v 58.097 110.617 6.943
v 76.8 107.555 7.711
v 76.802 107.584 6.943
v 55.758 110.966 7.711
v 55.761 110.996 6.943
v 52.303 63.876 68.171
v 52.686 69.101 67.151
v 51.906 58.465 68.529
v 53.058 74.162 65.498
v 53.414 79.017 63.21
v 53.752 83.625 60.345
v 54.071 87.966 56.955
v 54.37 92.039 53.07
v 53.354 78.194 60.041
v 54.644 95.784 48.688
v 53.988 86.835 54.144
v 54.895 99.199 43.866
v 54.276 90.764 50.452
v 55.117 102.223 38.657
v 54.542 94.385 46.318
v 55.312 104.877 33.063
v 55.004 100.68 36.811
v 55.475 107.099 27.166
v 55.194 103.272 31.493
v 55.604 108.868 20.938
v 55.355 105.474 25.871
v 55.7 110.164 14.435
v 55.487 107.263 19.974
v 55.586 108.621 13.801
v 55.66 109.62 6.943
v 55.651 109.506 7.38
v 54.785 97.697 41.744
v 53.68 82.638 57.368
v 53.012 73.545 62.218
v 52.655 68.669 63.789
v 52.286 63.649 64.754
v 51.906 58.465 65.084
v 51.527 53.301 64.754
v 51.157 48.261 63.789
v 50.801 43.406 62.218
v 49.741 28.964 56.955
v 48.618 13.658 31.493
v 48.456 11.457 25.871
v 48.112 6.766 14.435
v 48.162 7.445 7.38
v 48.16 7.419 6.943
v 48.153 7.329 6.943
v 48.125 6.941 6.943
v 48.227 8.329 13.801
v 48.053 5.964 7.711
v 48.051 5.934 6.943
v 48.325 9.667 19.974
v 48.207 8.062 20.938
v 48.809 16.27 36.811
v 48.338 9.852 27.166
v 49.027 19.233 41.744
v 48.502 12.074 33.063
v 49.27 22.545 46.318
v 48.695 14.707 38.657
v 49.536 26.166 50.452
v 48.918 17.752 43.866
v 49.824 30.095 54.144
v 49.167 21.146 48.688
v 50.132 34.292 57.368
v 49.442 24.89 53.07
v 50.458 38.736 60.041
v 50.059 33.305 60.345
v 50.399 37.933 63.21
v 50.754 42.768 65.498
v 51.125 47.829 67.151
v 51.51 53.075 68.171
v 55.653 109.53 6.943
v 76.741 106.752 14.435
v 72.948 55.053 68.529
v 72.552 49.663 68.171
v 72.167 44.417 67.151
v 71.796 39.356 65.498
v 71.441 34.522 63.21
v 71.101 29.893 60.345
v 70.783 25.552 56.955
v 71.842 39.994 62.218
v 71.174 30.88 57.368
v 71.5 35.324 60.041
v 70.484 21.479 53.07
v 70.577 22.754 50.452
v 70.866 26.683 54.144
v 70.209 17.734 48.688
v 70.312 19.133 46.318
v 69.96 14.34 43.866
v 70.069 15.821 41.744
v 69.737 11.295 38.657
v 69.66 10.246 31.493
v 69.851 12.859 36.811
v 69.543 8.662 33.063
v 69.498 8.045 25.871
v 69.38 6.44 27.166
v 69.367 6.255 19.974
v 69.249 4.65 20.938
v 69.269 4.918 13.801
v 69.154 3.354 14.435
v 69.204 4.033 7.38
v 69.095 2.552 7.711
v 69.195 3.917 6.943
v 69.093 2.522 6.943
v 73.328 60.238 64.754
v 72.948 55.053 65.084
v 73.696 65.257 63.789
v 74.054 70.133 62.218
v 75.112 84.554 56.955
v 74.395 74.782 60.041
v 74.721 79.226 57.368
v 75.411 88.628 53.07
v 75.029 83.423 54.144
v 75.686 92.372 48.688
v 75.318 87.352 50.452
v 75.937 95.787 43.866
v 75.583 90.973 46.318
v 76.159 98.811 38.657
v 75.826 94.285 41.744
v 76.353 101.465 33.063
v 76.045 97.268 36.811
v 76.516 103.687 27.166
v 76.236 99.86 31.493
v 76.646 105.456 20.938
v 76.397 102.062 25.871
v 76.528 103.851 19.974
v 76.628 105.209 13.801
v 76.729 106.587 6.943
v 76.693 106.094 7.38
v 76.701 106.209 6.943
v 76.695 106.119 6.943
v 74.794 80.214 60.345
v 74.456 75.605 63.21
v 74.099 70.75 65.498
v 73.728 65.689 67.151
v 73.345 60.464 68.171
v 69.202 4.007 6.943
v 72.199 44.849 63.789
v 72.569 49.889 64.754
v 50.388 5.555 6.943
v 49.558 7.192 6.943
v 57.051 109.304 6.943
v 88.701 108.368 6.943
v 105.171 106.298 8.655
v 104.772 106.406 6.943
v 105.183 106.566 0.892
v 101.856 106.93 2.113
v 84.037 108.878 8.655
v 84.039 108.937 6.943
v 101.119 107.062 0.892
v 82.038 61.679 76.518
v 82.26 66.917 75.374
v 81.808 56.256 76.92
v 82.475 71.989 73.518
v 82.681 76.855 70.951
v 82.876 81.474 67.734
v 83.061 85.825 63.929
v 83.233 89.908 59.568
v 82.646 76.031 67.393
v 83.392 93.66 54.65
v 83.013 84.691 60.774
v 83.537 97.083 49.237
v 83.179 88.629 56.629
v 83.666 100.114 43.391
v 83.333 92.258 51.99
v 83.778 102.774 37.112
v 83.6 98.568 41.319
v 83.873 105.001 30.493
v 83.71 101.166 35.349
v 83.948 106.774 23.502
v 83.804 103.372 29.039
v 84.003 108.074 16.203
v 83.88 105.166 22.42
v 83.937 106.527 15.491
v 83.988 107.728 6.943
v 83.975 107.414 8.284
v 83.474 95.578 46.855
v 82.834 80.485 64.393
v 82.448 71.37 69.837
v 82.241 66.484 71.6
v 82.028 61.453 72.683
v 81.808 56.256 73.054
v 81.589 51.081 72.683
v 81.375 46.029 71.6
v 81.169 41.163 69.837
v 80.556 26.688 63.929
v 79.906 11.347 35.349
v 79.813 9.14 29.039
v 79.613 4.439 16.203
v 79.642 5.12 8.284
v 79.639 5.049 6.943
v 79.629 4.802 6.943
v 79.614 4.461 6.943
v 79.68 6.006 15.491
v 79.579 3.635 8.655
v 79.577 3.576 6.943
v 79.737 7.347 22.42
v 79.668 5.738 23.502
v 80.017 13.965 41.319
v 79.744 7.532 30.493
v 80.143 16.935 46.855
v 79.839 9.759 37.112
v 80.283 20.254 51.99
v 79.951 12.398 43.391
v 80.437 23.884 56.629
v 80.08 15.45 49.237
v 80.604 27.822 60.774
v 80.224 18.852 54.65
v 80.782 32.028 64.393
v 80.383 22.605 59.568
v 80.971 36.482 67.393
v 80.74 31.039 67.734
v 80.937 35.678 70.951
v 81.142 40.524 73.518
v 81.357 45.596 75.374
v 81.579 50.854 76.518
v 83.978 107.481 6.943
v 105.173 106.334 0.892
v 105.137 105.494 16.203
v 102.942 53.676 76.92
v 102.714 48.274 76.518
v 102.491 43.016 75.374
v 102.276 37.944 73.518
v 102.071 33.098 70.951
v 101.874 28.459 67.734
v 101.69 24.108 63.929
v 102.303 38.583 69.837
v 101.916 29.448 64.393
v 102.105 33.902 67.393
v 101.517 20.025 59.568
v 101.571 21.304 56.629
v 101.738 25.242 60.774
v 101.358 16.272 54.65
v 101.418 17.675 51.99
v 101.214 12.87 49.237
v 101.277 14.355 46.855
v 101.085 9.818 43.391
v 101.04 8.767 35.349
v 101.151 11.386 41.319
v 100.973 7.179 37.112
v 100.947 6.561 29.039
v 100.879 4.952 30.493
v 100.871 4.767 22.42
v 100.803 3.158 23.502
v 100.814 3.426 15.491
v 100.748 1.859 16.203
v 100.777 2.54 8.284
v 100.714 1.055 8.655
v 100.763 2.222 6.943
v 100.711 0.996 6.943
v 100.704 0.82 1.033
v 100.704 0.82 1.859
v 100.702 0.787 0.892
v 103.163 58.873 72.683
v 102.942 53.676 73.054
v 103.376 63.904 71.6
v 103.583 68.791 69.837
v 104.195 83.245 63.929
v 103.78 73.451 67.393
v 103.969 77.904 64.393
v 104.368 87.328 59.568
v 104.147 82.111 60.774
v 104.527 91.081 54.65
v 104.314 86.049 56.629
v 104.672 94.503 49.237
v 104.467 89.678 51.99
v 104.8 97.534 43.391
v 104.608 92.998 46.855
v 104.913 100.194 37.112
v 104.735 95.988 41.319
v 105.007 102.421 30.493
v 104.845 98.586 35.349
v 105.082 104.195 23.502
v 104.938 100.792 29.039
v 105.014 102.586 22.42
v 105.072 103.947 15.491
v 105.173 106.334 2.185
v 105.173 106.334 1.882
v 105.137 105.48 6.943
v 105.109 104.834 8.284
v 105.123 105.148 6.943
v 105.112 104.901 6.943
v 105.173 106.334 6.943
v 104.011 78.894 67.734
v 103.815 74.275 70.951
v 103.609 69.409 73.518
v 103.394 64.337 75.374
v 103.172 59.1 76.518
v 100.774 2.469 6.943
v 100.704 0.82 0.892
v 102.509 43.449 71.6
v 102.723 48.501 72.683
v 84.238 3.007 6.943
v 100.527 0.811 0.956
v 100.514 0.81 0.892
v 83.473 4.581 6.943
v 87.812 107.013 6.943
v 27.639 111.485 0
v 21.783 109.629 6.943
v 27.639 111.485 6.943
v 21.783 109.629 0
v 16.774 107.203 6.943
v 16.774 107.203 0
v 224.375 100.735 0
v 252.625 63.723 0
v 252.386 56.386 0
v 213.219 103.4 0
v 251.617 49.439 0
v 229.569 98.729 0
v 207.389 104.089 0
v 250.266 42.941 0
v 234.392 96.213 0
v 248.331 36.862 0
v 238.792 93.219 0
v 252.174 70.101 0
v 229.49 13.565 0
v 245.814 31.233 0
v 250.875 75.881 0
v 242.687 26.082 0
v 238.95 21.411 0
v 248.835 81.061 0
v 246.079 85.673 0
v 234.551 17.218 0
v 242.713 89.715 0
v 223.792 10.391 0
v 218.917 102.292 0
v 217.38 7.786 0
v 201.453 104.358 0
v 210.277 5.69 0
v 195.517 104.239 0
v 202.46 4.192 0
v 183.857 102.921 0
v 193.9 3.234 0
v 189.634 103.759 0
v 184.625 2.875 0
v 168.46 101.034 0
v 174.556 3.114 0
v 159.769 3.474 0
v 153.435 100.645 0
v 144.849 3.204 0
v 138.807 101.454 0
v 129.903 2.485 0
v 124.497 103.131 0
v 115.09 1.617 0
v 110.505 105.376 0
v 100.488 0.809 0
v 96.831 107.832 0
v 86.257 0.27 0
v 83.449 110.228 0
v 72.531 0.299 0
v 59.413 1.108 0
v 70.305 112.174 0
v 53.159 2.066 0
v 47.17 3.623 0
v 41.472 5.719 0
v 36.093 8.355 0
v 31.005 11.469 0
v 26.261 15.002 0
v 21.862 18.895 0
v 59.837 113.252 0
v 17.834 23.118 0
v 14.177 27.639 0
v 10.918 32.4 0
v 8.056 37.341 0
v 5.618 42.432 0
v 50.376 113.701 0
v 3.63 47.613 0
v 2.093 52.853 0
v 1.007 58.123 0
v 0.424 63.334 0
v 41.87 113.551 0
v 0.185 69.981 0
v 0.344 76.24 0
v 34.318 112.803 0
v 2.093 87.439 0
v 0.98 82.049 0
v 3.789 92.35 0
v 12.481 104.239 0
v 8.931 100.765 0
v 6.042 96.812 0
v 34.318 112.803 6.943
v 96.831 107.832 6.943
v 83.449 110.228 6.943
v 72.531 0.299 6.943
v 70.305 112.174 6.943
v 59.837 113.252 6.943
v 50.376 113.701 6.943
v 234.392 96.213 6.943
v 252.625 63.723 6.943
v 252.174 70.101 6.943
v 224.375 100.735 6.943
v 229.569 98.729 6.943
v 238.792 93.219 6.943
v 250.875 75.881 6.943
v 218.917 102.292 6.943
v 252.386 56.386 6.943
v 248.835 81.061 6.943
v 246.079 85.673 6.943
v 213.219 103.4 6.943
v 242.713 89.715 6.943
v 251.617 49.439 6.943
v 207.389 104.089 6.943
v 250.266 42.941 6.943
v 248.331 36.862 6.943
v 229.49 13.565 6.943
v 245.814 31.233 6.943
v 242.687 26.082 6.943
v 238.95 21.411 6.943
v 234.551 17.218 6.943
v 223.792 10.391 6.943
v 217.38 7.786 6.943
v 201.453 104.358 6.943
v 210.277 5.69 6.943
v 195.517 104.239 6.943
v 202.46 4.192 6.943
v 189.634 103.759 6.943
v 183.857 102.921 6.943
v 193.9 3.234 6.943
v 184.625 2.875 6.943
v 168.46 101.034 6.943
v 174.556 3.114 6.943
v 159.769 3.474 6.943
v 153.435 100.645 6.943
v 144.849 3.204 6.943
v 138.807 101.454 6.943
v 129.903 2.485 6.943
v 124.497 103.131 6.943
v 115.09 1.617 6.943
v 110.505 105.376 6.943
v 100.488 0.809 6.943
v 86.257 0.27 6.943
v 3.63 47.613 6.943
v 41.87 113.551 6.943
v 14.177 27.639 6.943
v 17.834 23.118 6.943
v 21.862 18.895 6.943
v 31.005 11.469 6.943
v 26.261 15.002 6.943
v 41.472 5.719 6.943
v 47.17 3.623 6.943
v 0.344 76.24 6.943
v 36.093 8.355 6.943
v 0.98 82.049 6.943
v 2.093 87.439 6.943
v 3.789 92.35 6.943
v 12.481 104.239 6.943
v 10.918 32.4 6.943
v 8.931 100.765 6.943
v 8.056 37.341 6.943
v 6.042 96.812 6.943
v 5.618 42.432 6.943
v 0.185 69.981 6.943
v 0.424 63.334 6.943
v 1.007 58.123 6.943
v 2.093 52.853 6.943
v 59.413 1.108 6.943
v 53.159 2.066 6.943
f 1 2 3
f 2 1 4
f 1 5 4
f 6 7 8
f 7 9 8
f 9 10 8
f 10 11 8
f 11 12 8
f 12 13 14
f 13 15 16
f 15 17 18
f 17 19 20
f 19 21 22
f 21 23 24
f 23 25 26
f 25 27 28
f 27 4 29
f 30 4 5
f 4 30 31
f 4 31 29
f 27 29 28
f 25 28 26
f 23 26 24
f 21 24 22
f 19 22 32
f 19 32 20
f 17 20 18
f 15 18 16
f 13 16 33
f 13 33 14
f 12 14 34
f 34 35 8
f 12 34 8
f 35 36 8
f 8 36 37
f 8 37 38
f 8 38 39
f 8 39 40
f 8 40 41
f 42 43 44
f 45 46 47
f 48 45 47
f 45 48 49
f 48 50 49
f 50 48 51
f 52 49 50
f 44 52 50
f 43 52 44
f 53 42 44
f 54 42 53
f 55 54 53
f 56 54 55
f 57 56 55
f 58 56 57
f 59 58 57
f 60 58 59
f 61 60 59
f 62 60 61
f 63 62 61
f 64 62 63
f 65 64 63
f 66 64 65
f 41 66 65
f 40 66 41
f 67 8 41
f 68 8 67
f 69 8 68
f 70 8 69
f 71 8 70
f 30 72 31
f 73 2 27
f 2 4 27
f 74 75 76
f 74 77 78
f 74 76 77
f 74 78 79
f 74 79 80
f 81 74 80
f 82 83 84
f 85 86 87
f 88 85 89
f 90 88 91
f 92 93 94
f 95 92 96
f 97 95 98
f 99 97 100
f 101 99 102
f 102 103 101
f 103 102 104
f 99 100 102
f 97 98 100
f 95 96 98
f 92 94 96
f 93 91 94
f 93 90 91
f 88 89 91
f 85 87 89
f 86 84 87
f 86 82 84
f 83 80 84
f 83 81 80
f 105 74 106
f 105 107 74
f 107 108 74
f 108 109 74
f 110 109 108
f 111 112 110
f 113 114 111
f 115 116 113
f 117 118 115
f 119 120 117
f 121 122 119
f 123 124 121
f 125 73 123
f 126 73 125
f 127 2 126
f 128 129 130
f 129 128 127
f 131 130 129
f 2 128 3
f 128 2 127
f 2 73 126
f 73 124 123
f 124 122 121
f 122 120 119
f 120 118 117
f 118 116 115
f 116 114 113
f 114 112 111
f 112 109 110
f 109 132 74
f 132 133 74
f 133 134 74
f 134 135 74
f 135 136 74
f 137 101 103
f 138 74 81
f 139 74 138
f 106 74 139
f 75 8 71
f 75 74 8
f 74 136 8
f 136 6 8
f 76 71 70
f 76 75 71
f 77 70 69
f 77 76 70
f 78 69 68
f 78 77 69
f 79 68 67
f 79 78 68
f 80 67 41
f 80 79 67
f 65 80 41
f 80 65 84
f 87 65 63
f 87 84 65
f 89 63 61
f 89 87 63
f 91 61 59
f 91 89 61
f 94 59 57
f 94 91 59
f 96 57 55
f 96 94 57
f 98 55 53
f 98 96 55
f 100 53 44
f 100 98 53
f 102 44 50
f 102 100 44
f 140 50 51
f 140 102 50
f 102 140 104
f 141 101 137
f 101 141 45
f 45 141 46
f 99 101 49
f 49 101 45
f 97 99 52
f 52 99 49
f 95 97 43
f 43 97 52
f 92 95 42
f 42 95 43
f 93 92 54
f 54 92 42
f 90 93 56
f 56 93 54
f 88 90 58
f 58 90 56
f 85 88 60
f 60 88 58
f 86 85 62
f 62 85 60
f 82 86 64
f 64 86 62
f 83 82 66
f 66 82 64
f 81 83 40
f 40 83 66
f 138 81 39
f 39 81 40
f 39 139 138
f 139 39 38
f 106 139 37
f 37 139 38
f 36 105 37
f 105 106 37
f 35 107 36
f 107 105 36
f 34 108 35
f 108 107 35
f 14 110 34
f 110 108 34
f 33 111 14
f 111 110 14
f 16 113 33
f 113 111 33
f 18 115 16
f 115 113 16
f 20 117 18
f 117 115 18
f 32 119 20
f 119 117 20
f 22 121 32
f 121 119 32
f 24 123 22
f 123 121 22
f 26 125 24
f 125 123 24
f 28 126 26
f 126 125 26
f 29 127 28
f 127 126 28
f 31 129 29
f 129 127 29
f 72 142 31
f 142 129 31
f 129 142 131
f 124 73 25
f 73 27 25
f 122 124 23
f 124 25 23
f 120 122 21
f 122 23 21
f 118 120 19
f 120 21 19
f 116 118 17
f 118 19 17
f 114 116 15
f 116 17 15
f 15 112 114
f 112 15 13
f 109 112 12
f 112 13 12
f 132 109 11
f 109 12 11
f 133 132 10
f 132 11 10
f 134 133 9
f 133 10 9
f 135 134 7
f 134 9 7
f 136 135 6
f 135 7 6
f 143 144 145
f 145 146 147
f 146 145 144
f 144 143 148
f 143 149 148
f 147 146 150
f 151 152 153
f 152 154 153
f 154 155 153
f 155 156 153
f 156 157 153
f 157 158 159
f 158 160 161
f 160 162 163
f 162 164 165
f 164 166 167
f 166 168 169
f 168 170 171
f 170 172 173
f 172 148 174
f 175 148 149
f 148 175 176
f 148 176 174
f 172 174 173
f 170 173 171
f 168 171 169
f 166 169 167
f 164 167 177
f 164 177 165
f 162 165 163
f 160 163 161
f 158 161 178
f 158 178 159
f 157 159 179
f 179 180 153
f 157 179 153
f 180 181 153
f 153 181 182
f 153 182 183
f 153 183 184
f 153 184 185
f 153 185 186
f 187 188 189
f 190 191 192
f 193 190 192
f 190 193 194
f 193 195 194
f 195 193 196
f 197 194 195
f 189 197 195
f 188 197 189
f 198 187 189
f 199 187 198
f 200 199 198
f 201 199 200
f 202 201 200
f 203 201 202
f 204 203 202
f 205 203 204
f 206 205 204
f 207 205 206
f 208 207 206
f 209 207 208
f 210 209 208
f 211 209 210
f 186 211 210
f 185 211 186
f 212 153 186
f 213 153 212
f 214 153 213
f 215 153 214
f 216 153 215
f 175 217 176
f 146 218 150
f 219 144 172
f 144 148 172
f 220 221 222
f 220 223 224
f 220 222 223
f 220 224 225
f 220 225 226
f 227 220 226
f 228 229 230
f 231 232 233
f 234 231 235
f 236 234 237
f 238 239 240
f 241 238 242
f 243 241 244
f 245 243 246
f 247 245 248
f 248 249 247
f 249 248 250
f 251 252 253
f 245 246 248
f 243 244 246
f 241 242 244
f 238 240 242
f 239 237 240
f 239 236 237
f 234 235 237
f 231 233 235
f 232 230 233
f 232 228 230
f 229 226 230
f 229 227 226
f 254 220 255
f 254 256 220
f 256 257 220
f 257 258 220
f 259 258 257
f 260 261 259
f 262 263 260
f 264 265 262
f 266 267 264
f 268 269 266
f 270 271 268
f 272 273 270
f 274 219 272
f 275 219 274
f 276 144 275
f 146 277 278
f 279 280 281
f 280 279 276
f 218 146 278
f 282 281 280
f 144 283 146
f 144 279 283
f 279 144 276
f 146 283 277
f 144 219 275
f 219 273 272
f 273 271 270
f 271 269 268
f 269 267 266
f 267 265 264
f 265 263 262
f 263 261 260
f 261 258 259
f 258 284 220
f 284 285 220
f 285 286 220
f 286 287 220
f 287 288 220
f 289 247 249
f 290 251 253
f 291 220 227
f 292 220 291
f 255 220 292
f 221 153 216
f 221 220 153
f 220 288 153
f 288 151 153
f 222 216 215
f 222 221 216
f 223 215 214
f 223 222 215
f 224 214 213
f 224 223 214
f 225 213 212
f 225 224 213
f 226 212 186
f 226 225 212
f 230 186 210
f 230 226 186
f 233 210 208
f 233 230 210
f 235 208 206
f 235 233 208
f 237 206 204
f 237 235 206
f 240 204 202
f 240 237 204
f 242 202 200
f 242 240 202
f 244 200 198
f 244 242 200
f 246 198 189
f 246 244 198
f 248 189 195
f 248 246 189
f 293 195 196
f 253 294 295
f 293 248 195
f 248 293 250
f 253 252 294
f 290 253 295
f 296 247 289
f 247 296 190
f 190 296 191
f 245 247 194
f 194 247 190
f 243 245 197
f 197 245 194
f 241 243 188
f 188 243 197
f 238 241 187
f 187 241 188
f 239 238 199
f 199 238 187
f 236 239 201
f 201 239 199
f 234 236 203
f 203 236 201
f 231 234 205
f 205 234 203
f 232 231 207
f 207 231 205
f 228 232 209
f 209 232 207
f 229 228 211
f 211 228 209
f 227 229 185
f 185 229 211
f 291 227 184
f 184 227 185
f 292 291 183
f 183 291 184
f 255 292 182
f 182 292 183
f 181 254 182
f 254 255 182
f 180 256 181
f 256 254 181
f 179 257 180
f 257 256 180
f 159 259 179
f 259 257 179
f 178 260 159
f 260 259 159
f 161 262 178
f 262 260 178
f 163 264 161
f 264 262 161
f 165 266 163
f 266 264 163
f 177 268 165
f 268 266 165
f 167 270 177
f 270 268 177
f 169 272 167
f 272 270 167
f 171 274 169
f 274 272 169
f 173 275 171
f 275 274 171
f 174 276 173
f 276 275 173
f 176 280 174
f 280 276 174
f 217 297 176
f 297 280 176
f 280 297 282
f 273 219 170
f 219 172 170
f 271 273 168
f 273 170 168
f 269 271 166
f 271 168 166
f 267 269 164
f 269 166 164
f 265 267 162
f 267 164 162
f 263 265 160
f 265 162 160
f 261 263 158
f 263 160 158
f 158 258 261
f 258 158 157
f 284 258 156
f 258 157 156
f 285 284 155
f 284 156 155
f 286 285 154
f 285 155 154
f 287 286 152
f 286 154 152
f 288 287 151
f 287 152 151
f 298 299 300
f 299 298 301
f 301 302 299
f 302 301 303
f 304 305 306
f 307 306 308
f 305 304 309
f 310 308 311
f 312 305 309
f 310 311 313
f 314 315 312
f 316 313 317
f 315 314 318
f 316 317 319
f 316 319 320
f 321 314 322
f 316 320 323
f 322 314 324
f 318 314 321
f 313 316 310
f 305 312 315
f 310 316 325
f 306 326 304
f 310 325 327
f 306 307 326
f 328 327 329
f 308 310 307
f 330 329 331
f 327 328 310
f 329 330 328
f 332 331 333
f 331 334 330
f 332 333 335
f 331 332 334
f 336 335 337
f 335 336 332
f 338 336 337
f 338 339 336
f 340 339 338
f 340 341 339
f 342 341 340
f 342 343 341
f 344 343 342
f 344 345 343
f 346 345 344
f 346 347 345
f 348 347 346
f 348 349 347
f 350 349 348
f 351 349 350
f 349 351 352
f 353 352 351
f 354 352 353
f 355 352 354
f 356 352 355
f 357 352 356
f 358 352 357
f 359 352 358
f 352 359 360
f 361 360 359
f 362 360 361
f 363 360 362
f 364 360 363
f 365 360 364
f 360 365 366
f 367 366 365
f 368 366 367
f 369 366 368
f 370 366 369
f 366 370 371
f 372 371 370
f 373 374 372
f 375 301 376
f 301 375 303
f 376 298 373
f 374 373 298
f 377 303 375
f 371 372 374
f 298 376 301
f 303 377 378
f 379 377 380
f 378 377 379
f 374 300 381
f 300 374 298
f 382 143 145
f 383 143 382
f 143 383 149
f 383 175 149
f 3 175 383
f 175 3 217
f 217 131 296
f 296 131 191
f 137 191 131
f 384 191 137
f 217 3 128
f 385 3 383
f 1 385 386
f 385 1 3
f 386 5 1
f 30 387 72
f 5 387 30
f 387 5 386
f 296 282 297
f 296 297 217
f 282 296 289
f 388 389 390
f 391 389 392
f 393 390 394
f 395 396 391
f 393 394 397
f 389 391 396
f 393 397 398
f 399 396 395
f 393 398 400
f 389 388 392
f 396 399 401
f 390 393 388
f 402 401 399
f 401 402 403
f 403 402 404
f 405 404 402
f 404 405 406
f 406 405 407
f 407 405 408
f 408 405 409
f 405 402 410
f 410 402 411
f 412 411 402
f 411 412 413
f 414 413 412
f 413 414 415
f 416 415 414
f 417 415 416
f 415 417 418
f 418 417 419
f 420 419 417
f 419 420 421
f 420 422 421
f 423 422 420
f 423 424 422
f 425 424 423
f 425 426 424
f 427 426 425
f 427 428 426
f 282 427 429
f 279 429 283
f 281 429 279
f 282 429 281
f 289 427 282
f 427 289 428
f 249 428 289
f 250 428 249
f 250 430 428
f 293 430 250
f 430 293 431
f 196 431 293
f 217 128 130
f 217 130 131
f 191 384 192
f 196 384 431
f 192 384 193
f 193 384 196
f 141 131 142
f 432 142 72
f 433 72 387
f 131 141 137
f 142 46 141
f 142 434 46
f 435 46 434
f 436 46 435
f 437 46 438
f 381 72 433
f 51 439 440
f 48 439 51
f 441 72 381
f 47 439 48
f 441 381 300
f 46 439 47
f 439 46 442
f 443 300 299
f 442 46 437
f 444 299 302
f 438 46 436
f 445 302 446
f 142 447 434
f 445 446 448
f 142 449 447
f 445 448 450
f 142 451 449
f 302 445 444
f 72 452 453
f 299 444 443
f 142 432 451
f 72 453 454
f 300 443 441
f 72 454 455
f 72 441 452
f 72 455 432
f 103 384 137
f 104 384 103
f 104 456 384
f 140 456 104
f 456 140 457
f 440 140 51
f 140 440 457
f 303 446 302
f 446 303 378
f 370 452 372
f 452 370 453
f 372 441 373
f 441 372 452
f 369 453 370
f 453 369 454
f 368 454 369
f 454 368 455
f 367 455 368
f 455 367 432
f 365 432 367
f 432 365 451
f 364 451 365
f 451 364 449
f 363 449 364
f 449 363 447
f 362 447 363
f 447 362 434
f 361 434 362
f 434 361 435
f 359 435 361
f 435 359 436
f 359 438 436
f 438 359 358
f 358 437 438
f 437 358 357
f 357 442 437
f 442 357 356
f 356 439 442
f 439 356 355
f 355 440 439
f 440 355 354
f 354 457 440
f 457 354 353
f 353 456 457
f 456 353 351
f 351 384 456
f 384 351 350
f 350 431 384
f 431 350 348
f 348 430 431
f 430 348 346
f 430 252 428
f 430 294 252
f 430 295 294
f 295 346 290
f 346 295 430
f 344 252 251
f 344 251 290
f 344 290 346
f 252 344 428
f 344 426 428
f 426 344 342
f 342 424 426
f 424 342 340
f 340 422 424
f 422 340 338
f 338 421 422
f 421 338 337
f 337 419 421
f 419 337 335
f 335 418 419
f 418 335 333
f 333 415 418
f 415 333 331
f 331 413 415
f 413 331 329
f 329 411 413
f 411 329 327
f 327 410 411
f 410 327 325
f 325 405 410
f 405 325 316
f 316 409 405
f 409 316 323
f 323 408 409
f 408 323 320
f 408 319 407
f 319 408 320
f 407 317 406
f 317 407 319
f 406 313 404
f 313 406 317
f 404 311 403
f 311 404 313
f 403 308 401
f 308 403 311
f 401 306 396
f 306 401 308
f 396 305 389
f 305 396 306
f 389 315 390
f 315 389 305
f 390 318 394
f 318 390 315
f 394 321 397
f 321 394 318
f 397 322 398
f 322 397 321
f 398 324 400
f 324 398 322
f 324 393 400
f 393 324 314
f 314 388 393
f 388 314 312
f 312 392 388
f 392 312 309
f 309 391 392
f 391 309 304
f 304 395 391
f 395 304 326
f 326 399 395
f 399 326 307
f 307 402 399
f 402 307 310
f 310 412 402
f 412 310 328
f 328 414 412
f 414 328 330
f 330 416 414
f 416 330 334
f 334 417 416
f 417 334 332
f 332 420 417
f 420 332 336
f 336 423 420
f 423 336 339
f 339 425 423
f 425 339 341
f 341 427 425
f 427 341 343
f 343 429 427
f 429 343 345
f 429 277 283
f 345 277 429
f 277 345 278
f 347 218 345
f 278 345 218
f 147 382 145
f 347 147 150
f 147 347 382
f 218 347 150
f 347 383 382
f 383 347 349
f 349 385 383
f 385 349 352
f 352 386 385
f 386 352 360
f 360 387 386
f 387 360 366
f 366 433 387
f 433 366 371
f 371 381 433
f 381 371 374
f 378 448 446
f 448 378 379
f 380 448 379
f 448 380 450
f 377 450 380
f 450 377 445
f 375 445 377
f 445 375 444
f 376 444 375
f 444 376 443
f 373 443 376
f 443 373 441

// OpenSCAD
//OPENSTOCK by isaac budmen @ibudmen
// preview[view:south west, tilt:top diagonal]

Which_Foot = "first"; // [first:Left,second:Right]

// 1 wide or 2 thin?
Number_of_Straps = "second"; // [first:Single,second:Double]

sandal_size =  "fifth";// [first:Size 6,second:Size 6.5,third:Size 7,fourth:Size 7.5,fifth:Size 8,sixth:Size 8.5,seventh:Size 9,eigth:Size 9.5,ninth:Size 10,tenth:Size 10.5,eleventh:Size 11,twelveth:Size 11.5]

module print_Number_of_Straps() {
	if (Number_of_Straps == "first") {
		single();
	} else if (Number_of_Straps == "second") {
		double();
	}
}

module sandal(){print_Number_of_Straps(); print_foot();};


print_sandal_size();

module print_sandal_size() {
	if (sandal_size == "first") {
		scale([2.5,2.825,3.275])sandal();
	} else if (sandal_size == "second") {
		scale([2.55,2.8815,3.3405])sandal();
	} else if (sandal_size == "third") {
		scale([2.58,2.9154,3.3798])sandal();
	} else if (sandal_size == "fourth") {
		scale([2.6,2.938,3.406])sandal();
	} else if (sandal_size == "fifth") {
		scale([2.65,2.9945,3.4715])sandal();
	} else if (sandal_size == "sixth") {
		scale([2.7,3.051,3.537])sandal();
	} else if (sandal_size == "seventh") {
		scale([2.75,3.1075,3.6025])sandal();
	} else if (sandal_size == "eighth") {
		scale([2.8,3.164,3.668])sandal();
	} else if (sandal_size == "nineth") {
		scale([2.85,3.2205,3.7335])sandal();
	} else if (sandal_size == "tenth") {
		scale([2.9,3.277,3.799])sandal();
	} else if (sandal_size == "eleventh") {
		scale([2.95,3.3335,3.8645])sandal();
	} else if (sandal_size == "twelveth") {
		scale([3,3.39,3.93])sandal();
	}

}



module single(){
rotate([0,0,-3]){
translate([14,2.8,0])scale([2.7,1,1])Strap();
}}

module double(){rotate([0,0,-3])translate([18,2.8,0])scale([1,1,0.98])Strap();rotate([0,0,-1])translate([30,1.6,0])scale([1,1,1.1])Strap();}

module print_foot() {
	if (Which_Foot == "first") {
		Base1();
	} else if (Which_Foot == "second") {
		Base2();
	}
}

module Base(){rotate([180,0,-6])translate([0,-40.5,0])Base1();} 

/////////////////////
// MODULE Base1
/////////////////////

// Functions and Utilities
function Base1_dimX() = 95.26;
function Base1_dimY() = 37.88;
function Base1_dimZ() = 2.00;

/////////////////////
// geometry for Base1
function Base1_triangles() = [
[2,1,0],[3,1,2],[5,0,4],[2,0,5],[8,7,6],[9,7,8],[10,9,8],[11,10,8],[12,11,8],[13,12,8],[5,13,8],[2,5,8],[3,2,8],[14,3,8],[15,14,8],[16,15,8],[17,16,8],[18,17,8],[19,18,8],[20,19,8],[21,20,8],[22,21,8],[8,23,22],[8,24,23],[8,25,24],[8,26,25],[8,27,26],[28,27,8],[29,28,8],[30,29,8],[31,30,8],[32,31,8],[33,32,8],[34,33,8],[35,34,8],[36,35,8],[37,36,8],[38,37,8],[39,38,8],[40,39,8],[41,40,8],[42,41,8],[43,42,8],[44,43,8],[45,44,8],[46,45,8],[47,46,8],[48,47,8],[49,48,8],[50,49,8],[51,50,8],[52,51,8],[53,52,8],[54,53,8],[55,54,8],[56,55,8],[57,56,8],[58,57,8],[59,58,8],[60,59,8],[8,61,60],[8,62,61],[63,62,8],[64,63,8],[65,64,8],[66,65,8],[67,66,8],[68,67,8],[69,68,8],[70,69,8],[71,70,8],[72,71,8],[73,72,8],[74,73,8],[75,74,8],[76,75,8],[77,76,8],[78,77,8],[79,78,8],[80,79,8],[81,80,8],[82,81,8],[3,83,1],[14,83,3],[86,85,84],[88,84,87],[86,84,88],[87,84,89],[89,84,90],[90,84,91],[91,84,92],[92,84,93],[93,84,94],[94,84,95],[95,84,96],[96,84,97],[97,84,98],[98,84,99],[99,84,100],[100,84,101],[101,84,102],[102,84,103],[103,84,104],[104,84,105],[105,84,106],[106,84,107],[107,84,108],[108,84,109],[109,84,110],[110,84,111],[111,84,112],[112,84,113],[113,84,114],[114,84,115],[115,84,116],[116,84,117],[117,84,118],[118,84,119],[119,84,120],[120,84,121],[121,84,122],[122,84,123],[123,84,124],[124,84,125],[125,84,126],[126,84,127],[127,84,128],[128,84,129],[129,84,130],[130,84,131],[131,84,132],[132,84,133],[133,84,134],[134,84,135],[135,84,136],[136,84,137],[137,84,138],[138,84,139],[139,84,140],[140,84,141],[141,84,142],[142,84,143],[143,84,144],[144,84,145],[145,84,146],[146,84,147],[147,84,148],[148,84,149],[149,84,150],[150,84,151],[151,84,152],[152,84,83],[83,84,1],[1,84,0],[0,84,4],[4,84,153],[153,84,154],[154,84,155],[155,84,156],[156,84,157],[157,84,158],[158,84,159],[13,4,153],[5,4,13],[8,85,82],[84,85,8],[8,159,84],[6,159,8],[82,86,81],[85,86,82],[81,88,80],[86,88,81],[80,87,79],[88,87,80],[79,89,78],[87,89,79],[78,90,77],[89,90,78],[77,91,76],[90,91,77],[76,92,75],[91,92,76],[75,93,74],[92,93,75],[94,73,74],[94,74,93],[95,72,73],[95,73,94],[96,71,72],[96,72,95],[97,70,71],[97,71,96],[98,69,70],[98,70,97],[99,68,69],[99,69,98],[100,67,68],[100,68,99],[101,66,67],[101,67,100],[102,65,66],[102,66,101],[103,64,65],[103,65,102],[104,63,64],[104,64,103],[105,62,63],[105,63,104],[106,61,62],[106,62,105],[107,60,61],[107,61,106],[108,59,60],[108,60,107],[109,58,59],[109,59,108],[110,57,58],[110,58,109],[111,56,57],[111,57,110],[112,55,56],[112,56,111],[113,54,55],[113,55,112],[114,53,54],[114,54,113],[115,52,53],[115,53,114],[116,51,52],[116,52,115],[117,50,51],[117,51,116],[118,49,50],[118,50,117],[119,48,49],[119,49,118],[120,47,48],[120,48,119],[121,46,47],[121,47,120],[122,45,46],[122,46,121],[123,44,45],[123,45,122],[124,43,44],[124,44,123],[125,42,43],[125,43,124],[125,126,41],[125,41,42],[126,127,40],[126,40,41],[127,128,39],[127,39,40],[128,129,38],[128,38,39],[129,130,37],[129,37,38],[36,130,131],[37,130,36],[35,131,132],[36,131,35],[34,132,133],[35,132,34],[33,133,134],[34,133,33],[32,134,135],[33,134,32],[31,135,136],[32,135,31],[30,136,137],[31,136,30],[29,137,138],[30,137,29],[28,138,139],[29,138,28],[27,139,140],[28,139,27],[26,140,141],[27,140,26],[25,141,142],[26,141,25],[24,142,143],[25,142,24],[23,143,144],[24,143,23],[22,144,145],[23,144,22],[21,145,146],[22,145,21],[20,146,147],[21,146,20],[19,147,148],[20,147,19],[18,148,149],[19,148,18],[17,149,150],[18,149,17],[16,150,151],[17,150,16],[15,151,152],[16,151,15],[14,152,83],[15,152,14],[12,153,154],[13,153,12],[11,154,155],[12,154,11],[10,155,156],[11,155,10],[9,156,157],[10,156,9],[7,157,158],[9,157,7],[6,158,159],[7,158,6]];
function Base1_points() = [
[8.220000,36.610001,2.000000],[10.430000,37.230000,2.000000],[8.220000,36.610001,0.000000],[10.430000,37.230000,0.000000],[6.330000,35.799999,2.000000],[6.330000,35.799999,0.000000],[0.130000,25.459999,0.000000],[0.370000,27.400000,0.000000],[0.070000,23.370001,0.000000],[0.790000,29.200001,0.000000],[1.430000,30.840000,0.000000],[2.280000,32.330002,0.000000],[3.370000,33.650002,0.000000],[4.710000,34.810001,0.000000],[12.950000,37.669998,0.000000],[15.800000,37.919998,0.000000],[19.010000,37.970001,0.000000],[22.580000,37.820000,0.000000],[26.530001,37.459999,0.000000],[31.490000,36.810001,0.000000],[36.540001,36.009998,0.000000],[41.700001,35.189999,0.000000],[46.980000,34.439999,0.000000],[52.380001,33.880001,0.000000],[57.900002,33.610001,0.000000],[63.570000,33.740002,0.000000],[69.379997,34.369999,0.000000],[71.559998,34.650002,0.000000],[73.779999,34.810001,0.000000],[76.019997,34.849998,0.000000],[78.260002,34.759998,0.000000],[80.459999,34.529999,0.000000],[82.610001,34.160000,0.000000],[84.669998,33.639999,0.000000],[86.629997,32.970001,0.000000],[88.449997,32.130001,0.000000],[90.110001,31.129999,0.000000],[91.589996,29.959999,0.000000],[92.860001,28.610001,0.000000],[93.900002,27.070000,0.000000],[94.669998,25.340000,0.000000],[95.160004,23.410000,0.000000],[95.330002,21.280001,0.000000],[95.239998,18.830000,0.000000],[94.949997,16.510000,0.000000],[94.440002,14.340000,0.000000],[93.709999,12.310000,0.000000],[92.760002,10.430000,0.000000],[91.580002,8.710000,0.000000],[90.169998,7.150000,0.000000],[88.510002,5.750000,0.000000],[86.599998,4.530000,0.000000],[84.449997,3.470000,0.000000],[82.029999,2.600000,0.000000],[79.349998,1.900000,0.000000],[76.400002,1.400000,0.000000],[73.169998,1.080000,0.000000],[69.669998,0.960000,0.000000],[65.870003,1.040000,0.000000],[60.290001,1.160000,0.000000],[54.660000,1.070000,0.000000],[49.020000,0.830000,0.000000],[43.430000,0.540000,0.000000],[37.919998,0.270000,0.000000],[32.549999,0.090000,0.000000],[27.370001,0.100000,0.000000],[22.420000,0.370000,0.000000],[20.059999,0.690000,0.000000],[17.799999,1.210000,0.000000],[15.650000,1.910000,0.000000],[13.620000,2.790000,0.000000],[11.700000,3.830000,0.000000],[9.910000,5.010000,0.000000],[8.250000,6.310000,0.000000],[6.730000,7.720000,0.000000],[5.350000,9.230000,0.000000],[4.120000,10.820000,0.000000],[3.040000,12.470000,0.000000],[2.120000,14.170000,0.000000],[1.370000,15.900000,0.000000],[0.790000,17.650000,0.000000],[0.380000,19.410000,0.000000],[0.160000,21.150000,0.000000],[12.950000,37.669998,2.000000],[0.070000,23.370001,2.000000],[0.160000,21.150000,2.000000],[0.380000,19.410000,2.000000],[1.370000,15.900000,2.000000],[0.790000,17.650000,2.000000],[2.120000,14.170000,2.000000],[3.040000,12.470000,2.000000],[4.120000,10.820000,2.000000],[5.350000,9.230000,2.000000],[6.730000,7.720000,2.000000],[8.250000,6.310000,2.000000],[9.910000,5.010000,2.000000],[11.700000,3.830000,2.000000],[13.620000,2.790000,2.000000],[15.650000,1.910000,2.000000],[17.799999,1.210000,2.000000],[20.059999,0.690000,2.000000],[22.420000,0.370000,2.000000],[27.370001,0.100000,2.000000],[32.549999,0.090000,2.000000],[37.919998,0.270000,2.000000],[43.430000,0.540000,2.000000],[49.020000,0.830000,2.000000],[54.660000,1.070000,2.000000],[60.290001,1.160000,2.000000],[65.870003,1.040000,2.000000],[69.669998,0.960000,2.000000],[73.169998,1.080000,2.000000],[76.400002,1.400000,2.000000],[79.349998,1.900000,2.000000],[82.029999,2.600000,2.000000],[84.449997,3.470000,2.000000],[86.599998,4.530000,2.000000],[88.510002,5.750000,2.000000],[90.169998,7.150000,2.000000],[91.580002,8.710000,2.000000],[92.760002,10.430000,2.000000],[93.709999,12.310000,2.000000],[94.440002,14.340000,2.000000],[94.949997,16.510000,2.000000],[95.239998,18.830000,2.000000],[95.330002,21.280001,2.000000],[95.160004,23.410000,2.000000],[94.669998,25.340000,2.000000],[93.900002,27.070000,2.000000],[92.860001,28.610001,2.000000],[91.589996,29.959999,2.000000],[90.110001,31.129999,2.000000],[88.449997,32.130001,2.000000],[86.629997,32.970001,2.000000],[84.669998,33.639999,2.000000],[82.610001,34.160000,2.000000],[80.459999,34.529999,2.000000],[78.260002,34.759998,2.000000],[76.019997,34.849998,2.000000],[73.779999,34.810001,2.000000],[71.559998,34.650002,2.000000],[69.379997,34.369999,2.000000],[63.570000,33.740002,2.000000],[57.900002,33.610001,2.000000],[52.380001,33.880001,2.000000],[46.980000,34.439999,2.000000],[41.700001,35.189999,2.000000],[36.540001,36.009998,2.000000],[31.490000,36.810001,2.000000],[26.530001,37.459999,2.000000],[22.580000,37.820000,2.000000],[19.010000,37.970001,2.000000],[15.800000,37.919998,2.000000],[4.710000,34.810001,2.000000],[3.370000,33.650002,2.000000],[2.280000,32.330002,2.000000],[1.430000,30.840000,2.000000],[0.790000,29.200001,2.000000],[0.370000,27.400000,2.000000],[0.130000,25.459999,2.000000]];module Base1() {
  polyhedron(triangles = Base1_triangles(), points = Base1_points(), convexity=10);
};

/////////////////////
// MODULE Strap
/////////////////////

// Functions and Utilities
function Strap_dimX() = 9.06;
function Strap_dimY() = 36.07;
function Strap_dimZ() = 19.91;

/////////////////////
// geometry for Strap
function Strap_triangles() = [
[2,1,0],[3,1,2],[6,5,4],[7,5,6],[8,7,6],[9,8,6],[10,9,6],[12,10,11],[14,12,13],[16,14,15],[18,16,17],[20,18,19],[22,20,21],[24,22,23],[26,24,25],[2,26,27],[3,2,28],[28,2,27],[27,26,25],[25,24,23],[23,22,21],[21,20,19],[19,18,29],[29,18,17],[17,16,15],[15,14,13],[13,12,30],[30,12,11],[11,10,31],[31,6,32],[31,10,6],[32,6,33],[33,6,34],[35,34,6],[6,36,35],[6,37,36],[6,38,37],[41,40,39],[44,43,42],[45,44,42],[46,44,45],[47,46,45],[40,46,47],[39,40,47],[48,40,41],[49,48,41],[50,48,49],[51,50,49],[52,50,51],[53,52,51],[54,52,53],[55,54,53],[56,54,55],[57,56,55],[58,56,57],[59,58,57],[60,58,59],[61,60,59],[38,60,61],[37,38,61],[62,38,6],[63,62,6],[64,63,6],[65,64,6],[66,65,6],[67,3,28],[67,1,3],[68,1,67],[26,0,69],[2,0,26],[72,71,70],[74,70,73],[72,70,74],[73,70,75],[75,70,76],[76,70,77],[80,79,78],[83,82,81],[85,81,84],[87,84,86],[90,89,88],[92,88,91],[94,91,93],[96,93,95],[98,95,97],[98,97,99],[96,95,98],[94,93,96],[92,91,94],[90,88,92],[87,89,90],[87,86,89],[85,84,87],[83,81,85],[80,82,83],[80,78,82],[76,79,80],[76,77,79],[101,70,100],[100,70,102],[102,70,103],[103,70,104],[105,103,104],[107,105,106],[109,107,108],[111,109,110],[113,111,112],[115,113,114],[117,115,116],[119,117,118],[120,119,69],[121,120,69],[122,121,0],[123,122,1],[68,123,1],[1,122,0],[0,121,69],[69,119,118],[118,117,116],[116,115,114],[114,113,112],[112,111,110],[110,109,108],[108,107,106],[106,105,104],[104,70,124],[124,70,125],[125,70,126],[126,70,127],[127,70,128],[99,97,129],[70,130,77],[70,131,130],[70,101,131],[71,66,6],[71,6,70],[128,70,6],[128,6,4],[72,65,66],[72,66,71],[74,64,65],[74,65,72],[73,63,64],[73,64,74],[75,62,63],[75,63,73],[76,38,62],[76,62,75],[80,60,38],[80,38,76],[83,58,60],[83,60,80],[85,56,58],[85,58,83],[87,54,56],[87,56,85],[90,52,54],[90,54,87],[92,50,52],[92,52,90],[94,48,50],[94,50,92],[96,40,48],[96,48,94],[98,46,40],[98,40,96],[99,44,46],[99,46,98],[44,129,43],[99,129,44],[42,129,97],[43,129,42],[45,97,95],[42,97,45],[47,95,93],[45,95,47],[39,93,91],[47,93,39],[41,91,88],[39,91,41],[49,88,89],[41,88,49],[51,89,86],[49,89,51],[53,86,84],[51,86,53],[55,84,81],[53,84,55],[57,81,82],[55,81,57],[59,82,78],[57,82,59],[61,78,79],[59,78,61],[37,79,77],[61,79,37],[36,77,130],[37,77,36],[35,130,131],[36,130,35],[34,131,101],[35,131,34],[34,100,33],[101,100,34],[33,102,32],[100,102,33],[32,103,31],[102,103,32],[31,105,11],[103,105,31],[11,107,30],[105,107,11],[30,109,13],[107,109,30],[13,111,15],[109,111,13],[15,113,17],[111,113,15],[115,29,17],[115,17,113],[117,19,29],[117,29,115],[119,21,19],[119,19,117],[120,23,21],[120,21,119],[121,25,23],[121,23,120],[122,27,25],[122,25,121],[123,28,27],[123,27,122],[68,67,28],[68,28,123],[24,69,118],[26,69,24],[22,118,116],[24,118,22],[20,116,114],[22,116,20],[18,114,112],[20,114,18],[16,112,110],[18,112,16],[14,110,108],[16,110,14],[12,108,106],[14,108,12],[106,104,10],[106,10,12],[104,124,9],[104,9,10],[124,125,8],[124,8,9],[125,126,7],[125,7,8],[126,127,5],[126,5,7],[127,128,4],[127,4,5]];
function Strap_points() = [
[9.061710,34.584900,2.266600],[9.064440,34.674500,0.233500],[1.072680,35.307098,2.266600],[1.075400,35.396702,0.233500],[0.593490,19.534700,20.038000],[0.646663,21.284901,19.738300],[0.538432,17.722500,20.143299],[0.698162,22.980000,19.252300],[0.747567,24.606100,18.580000],[0.794460,26.149599,17.737600],[0.838631,27.603500,16.741301],[0.739193,24.330500,17.648500],[0.880081,28.967800,15.599200],[0.827117,27.224501,15.915100],[0.918182,30.221901,14.311300],[0.867102,28.540600,14.829700],[0.952933,31.365801,12.893800],[0.903947,29.753401,13.614700],[0.983707,32.378700,11.362900],[0.968006,31.861900,10.820200],[1.010710,33.267502,9.718600],[0.994383,32.730099,9.256900],[1.033320,34.011700,7.985200],[1.016780,33.467400,7.604500],[1.051320,34.604301,6.154600],[1.035000,34.066799,5.871100],[1.064510,35.038399,4.243000],[1.048810,34.521599,4.056700],[1.057810,34.817902,2.169400],[0.937651,30.862700,12.270100],[0.784411,25.818899,16.862801],[0.691881,22.773199,18.288401],[0.642267,21.140200,18.750099],[0.591187,19.458900,19.033600],[0.538432,17.722500,19.130800],[0.485887,15.993000,19.033600],[0.434598,14.304800,18.750099],[0.385193,12.678600,18.288401],[0.238233,7.841440,16.741301],[0.060082,1.977590,7.604500],[0.012351,0.406542,4.243000],[0.082482,2.714870,9.256900],[0.019260,0.633930,2.169400],[0.015282,0.503010,0.233500],[0.001465,0.048234,0.233500],[0.028261,0.930223,4.056700],[0.004187,0.137811,2.266600],[0.041869,1.378110,5.871100],[0.025540,0.840646,6.154600],[0.109068,3.589970,10.820200],[0.043753,1.440120,7.985200],[0.139214,4.582210,12.270100],[0.066362,2.184300,9.718600],[0.172918,5.691590,13.614700],[0.093158,3.066290,11.362900],[0.209763,6.904320,14.829700],[0.124141,4.086090,12.893800],[0.249747,8.220420,15.915100],[0.158683,5.223030,14.311300],[0.292453,9.626090,16.862801],[0.196783,6.477110,15.599200],[0.337672,11.114400,17.648500],[0.282405,9.295340,17.737600],[0.329507,10.845700,18.580000],[0.378703,12.465000,19.252300],[0.430202,14.160100,19.738300],[0.483584,15.917200,20.038000],[1.061580,34.941898,0.233500],[9.050620,34.219700,0.233500],[9.053550,34.316200,4.243000],[8.527470,17.000200,20.143299],[8.472620,15.194900,20.038000],[8.419240,13.437800,19.738300],[8.318540,10.123500,18.580000],[8.367740,11.742800,19.252300],[8.271440,8.573110,17.737600],[8.227270,7.119200,16.741301],[8.374230,11.956400,18.288401],[8.281490,8.903850,16.862801],[8.326710,10.392200,17.648500],[8.185820,5.754870,15.599200],[8.198800,6.182090,14.829700],[8.238780,7.498180,15.915100],[8.147720,4.500800,14.311300],[8.161950,4.969350,13.614700],[8.113180,3.363860,12.893800],[8.128250,3.859980,12.270100],[8.082190,2.344060,11.362900],[8.071520,1.992640,9.256900],[8.098100,2.867740,10.820200],[8.055400,1.462070,9.718600],[8.049120,1.255350,7.604500],[8.032790,0.717887,7.985200],[8.030910,0.655873,5.871100],[8.014580,0.118410,6.154600],[8.017300,0.207987,4.056700],[8.001390,-0.315694,4.243000],[8.008300,-0.088306,2.169400],[7.993220,-0.584425,2.266600],[7.990500,-0.674002,0.233500],[8.580220,18.736700,19.033600],[8.527470,17.000200,19.130800],[8.631300,20.417999,18.750099],[8.680920,22.051001,18.288401],[8.827670,26.881300,16.741301],[8.728230,23.608299,17.648500],[8.869120,28.245600,15.599200],[8.773450,25.096600,16.862801],[8.907220,29.499701,14.311300],[8.816150,26.502300,15.915100],[8.941970,30.643499,12.893800],[8.856140,27.818399,14.829700],[8.972740,31.656401,11.362900],[8.892980,29.031099,13.614700],[8.999750,32.545300,9.718600],[8.926690,30.140499,12.270100],[9.022360,33.289501,7.985200],[8.957040,31.139601,10.820200],[9.040360,33.882099,6.154600],[8.983420,32.007801,9.256900],[9.005820,32.745098,7.604500],[9.024030,33.344601,5.871100],[9.037850,33.799400,4.056700],[9.046850,34.095699,2.169400],[8.783500,25.427401,17.737600],[8.736600,23.883900,18.580000],[8.687200,22.257700,19.252300],[8.635700,20.562700,19.738300],[8.582530,18.812500,20.038000],[8.004320,-0.219226,0.233500],[8.423630,13.582500,18.750099],[8.474920,15.270700,19.033600]];module Strap() {
  polyhedron(triangles = Strap_triangles(), points = Strap_points(), convexity=10);
};

////

module Base2(){rotate([180,0,-6])translate([0,-40.5,0])Base1();}; 
